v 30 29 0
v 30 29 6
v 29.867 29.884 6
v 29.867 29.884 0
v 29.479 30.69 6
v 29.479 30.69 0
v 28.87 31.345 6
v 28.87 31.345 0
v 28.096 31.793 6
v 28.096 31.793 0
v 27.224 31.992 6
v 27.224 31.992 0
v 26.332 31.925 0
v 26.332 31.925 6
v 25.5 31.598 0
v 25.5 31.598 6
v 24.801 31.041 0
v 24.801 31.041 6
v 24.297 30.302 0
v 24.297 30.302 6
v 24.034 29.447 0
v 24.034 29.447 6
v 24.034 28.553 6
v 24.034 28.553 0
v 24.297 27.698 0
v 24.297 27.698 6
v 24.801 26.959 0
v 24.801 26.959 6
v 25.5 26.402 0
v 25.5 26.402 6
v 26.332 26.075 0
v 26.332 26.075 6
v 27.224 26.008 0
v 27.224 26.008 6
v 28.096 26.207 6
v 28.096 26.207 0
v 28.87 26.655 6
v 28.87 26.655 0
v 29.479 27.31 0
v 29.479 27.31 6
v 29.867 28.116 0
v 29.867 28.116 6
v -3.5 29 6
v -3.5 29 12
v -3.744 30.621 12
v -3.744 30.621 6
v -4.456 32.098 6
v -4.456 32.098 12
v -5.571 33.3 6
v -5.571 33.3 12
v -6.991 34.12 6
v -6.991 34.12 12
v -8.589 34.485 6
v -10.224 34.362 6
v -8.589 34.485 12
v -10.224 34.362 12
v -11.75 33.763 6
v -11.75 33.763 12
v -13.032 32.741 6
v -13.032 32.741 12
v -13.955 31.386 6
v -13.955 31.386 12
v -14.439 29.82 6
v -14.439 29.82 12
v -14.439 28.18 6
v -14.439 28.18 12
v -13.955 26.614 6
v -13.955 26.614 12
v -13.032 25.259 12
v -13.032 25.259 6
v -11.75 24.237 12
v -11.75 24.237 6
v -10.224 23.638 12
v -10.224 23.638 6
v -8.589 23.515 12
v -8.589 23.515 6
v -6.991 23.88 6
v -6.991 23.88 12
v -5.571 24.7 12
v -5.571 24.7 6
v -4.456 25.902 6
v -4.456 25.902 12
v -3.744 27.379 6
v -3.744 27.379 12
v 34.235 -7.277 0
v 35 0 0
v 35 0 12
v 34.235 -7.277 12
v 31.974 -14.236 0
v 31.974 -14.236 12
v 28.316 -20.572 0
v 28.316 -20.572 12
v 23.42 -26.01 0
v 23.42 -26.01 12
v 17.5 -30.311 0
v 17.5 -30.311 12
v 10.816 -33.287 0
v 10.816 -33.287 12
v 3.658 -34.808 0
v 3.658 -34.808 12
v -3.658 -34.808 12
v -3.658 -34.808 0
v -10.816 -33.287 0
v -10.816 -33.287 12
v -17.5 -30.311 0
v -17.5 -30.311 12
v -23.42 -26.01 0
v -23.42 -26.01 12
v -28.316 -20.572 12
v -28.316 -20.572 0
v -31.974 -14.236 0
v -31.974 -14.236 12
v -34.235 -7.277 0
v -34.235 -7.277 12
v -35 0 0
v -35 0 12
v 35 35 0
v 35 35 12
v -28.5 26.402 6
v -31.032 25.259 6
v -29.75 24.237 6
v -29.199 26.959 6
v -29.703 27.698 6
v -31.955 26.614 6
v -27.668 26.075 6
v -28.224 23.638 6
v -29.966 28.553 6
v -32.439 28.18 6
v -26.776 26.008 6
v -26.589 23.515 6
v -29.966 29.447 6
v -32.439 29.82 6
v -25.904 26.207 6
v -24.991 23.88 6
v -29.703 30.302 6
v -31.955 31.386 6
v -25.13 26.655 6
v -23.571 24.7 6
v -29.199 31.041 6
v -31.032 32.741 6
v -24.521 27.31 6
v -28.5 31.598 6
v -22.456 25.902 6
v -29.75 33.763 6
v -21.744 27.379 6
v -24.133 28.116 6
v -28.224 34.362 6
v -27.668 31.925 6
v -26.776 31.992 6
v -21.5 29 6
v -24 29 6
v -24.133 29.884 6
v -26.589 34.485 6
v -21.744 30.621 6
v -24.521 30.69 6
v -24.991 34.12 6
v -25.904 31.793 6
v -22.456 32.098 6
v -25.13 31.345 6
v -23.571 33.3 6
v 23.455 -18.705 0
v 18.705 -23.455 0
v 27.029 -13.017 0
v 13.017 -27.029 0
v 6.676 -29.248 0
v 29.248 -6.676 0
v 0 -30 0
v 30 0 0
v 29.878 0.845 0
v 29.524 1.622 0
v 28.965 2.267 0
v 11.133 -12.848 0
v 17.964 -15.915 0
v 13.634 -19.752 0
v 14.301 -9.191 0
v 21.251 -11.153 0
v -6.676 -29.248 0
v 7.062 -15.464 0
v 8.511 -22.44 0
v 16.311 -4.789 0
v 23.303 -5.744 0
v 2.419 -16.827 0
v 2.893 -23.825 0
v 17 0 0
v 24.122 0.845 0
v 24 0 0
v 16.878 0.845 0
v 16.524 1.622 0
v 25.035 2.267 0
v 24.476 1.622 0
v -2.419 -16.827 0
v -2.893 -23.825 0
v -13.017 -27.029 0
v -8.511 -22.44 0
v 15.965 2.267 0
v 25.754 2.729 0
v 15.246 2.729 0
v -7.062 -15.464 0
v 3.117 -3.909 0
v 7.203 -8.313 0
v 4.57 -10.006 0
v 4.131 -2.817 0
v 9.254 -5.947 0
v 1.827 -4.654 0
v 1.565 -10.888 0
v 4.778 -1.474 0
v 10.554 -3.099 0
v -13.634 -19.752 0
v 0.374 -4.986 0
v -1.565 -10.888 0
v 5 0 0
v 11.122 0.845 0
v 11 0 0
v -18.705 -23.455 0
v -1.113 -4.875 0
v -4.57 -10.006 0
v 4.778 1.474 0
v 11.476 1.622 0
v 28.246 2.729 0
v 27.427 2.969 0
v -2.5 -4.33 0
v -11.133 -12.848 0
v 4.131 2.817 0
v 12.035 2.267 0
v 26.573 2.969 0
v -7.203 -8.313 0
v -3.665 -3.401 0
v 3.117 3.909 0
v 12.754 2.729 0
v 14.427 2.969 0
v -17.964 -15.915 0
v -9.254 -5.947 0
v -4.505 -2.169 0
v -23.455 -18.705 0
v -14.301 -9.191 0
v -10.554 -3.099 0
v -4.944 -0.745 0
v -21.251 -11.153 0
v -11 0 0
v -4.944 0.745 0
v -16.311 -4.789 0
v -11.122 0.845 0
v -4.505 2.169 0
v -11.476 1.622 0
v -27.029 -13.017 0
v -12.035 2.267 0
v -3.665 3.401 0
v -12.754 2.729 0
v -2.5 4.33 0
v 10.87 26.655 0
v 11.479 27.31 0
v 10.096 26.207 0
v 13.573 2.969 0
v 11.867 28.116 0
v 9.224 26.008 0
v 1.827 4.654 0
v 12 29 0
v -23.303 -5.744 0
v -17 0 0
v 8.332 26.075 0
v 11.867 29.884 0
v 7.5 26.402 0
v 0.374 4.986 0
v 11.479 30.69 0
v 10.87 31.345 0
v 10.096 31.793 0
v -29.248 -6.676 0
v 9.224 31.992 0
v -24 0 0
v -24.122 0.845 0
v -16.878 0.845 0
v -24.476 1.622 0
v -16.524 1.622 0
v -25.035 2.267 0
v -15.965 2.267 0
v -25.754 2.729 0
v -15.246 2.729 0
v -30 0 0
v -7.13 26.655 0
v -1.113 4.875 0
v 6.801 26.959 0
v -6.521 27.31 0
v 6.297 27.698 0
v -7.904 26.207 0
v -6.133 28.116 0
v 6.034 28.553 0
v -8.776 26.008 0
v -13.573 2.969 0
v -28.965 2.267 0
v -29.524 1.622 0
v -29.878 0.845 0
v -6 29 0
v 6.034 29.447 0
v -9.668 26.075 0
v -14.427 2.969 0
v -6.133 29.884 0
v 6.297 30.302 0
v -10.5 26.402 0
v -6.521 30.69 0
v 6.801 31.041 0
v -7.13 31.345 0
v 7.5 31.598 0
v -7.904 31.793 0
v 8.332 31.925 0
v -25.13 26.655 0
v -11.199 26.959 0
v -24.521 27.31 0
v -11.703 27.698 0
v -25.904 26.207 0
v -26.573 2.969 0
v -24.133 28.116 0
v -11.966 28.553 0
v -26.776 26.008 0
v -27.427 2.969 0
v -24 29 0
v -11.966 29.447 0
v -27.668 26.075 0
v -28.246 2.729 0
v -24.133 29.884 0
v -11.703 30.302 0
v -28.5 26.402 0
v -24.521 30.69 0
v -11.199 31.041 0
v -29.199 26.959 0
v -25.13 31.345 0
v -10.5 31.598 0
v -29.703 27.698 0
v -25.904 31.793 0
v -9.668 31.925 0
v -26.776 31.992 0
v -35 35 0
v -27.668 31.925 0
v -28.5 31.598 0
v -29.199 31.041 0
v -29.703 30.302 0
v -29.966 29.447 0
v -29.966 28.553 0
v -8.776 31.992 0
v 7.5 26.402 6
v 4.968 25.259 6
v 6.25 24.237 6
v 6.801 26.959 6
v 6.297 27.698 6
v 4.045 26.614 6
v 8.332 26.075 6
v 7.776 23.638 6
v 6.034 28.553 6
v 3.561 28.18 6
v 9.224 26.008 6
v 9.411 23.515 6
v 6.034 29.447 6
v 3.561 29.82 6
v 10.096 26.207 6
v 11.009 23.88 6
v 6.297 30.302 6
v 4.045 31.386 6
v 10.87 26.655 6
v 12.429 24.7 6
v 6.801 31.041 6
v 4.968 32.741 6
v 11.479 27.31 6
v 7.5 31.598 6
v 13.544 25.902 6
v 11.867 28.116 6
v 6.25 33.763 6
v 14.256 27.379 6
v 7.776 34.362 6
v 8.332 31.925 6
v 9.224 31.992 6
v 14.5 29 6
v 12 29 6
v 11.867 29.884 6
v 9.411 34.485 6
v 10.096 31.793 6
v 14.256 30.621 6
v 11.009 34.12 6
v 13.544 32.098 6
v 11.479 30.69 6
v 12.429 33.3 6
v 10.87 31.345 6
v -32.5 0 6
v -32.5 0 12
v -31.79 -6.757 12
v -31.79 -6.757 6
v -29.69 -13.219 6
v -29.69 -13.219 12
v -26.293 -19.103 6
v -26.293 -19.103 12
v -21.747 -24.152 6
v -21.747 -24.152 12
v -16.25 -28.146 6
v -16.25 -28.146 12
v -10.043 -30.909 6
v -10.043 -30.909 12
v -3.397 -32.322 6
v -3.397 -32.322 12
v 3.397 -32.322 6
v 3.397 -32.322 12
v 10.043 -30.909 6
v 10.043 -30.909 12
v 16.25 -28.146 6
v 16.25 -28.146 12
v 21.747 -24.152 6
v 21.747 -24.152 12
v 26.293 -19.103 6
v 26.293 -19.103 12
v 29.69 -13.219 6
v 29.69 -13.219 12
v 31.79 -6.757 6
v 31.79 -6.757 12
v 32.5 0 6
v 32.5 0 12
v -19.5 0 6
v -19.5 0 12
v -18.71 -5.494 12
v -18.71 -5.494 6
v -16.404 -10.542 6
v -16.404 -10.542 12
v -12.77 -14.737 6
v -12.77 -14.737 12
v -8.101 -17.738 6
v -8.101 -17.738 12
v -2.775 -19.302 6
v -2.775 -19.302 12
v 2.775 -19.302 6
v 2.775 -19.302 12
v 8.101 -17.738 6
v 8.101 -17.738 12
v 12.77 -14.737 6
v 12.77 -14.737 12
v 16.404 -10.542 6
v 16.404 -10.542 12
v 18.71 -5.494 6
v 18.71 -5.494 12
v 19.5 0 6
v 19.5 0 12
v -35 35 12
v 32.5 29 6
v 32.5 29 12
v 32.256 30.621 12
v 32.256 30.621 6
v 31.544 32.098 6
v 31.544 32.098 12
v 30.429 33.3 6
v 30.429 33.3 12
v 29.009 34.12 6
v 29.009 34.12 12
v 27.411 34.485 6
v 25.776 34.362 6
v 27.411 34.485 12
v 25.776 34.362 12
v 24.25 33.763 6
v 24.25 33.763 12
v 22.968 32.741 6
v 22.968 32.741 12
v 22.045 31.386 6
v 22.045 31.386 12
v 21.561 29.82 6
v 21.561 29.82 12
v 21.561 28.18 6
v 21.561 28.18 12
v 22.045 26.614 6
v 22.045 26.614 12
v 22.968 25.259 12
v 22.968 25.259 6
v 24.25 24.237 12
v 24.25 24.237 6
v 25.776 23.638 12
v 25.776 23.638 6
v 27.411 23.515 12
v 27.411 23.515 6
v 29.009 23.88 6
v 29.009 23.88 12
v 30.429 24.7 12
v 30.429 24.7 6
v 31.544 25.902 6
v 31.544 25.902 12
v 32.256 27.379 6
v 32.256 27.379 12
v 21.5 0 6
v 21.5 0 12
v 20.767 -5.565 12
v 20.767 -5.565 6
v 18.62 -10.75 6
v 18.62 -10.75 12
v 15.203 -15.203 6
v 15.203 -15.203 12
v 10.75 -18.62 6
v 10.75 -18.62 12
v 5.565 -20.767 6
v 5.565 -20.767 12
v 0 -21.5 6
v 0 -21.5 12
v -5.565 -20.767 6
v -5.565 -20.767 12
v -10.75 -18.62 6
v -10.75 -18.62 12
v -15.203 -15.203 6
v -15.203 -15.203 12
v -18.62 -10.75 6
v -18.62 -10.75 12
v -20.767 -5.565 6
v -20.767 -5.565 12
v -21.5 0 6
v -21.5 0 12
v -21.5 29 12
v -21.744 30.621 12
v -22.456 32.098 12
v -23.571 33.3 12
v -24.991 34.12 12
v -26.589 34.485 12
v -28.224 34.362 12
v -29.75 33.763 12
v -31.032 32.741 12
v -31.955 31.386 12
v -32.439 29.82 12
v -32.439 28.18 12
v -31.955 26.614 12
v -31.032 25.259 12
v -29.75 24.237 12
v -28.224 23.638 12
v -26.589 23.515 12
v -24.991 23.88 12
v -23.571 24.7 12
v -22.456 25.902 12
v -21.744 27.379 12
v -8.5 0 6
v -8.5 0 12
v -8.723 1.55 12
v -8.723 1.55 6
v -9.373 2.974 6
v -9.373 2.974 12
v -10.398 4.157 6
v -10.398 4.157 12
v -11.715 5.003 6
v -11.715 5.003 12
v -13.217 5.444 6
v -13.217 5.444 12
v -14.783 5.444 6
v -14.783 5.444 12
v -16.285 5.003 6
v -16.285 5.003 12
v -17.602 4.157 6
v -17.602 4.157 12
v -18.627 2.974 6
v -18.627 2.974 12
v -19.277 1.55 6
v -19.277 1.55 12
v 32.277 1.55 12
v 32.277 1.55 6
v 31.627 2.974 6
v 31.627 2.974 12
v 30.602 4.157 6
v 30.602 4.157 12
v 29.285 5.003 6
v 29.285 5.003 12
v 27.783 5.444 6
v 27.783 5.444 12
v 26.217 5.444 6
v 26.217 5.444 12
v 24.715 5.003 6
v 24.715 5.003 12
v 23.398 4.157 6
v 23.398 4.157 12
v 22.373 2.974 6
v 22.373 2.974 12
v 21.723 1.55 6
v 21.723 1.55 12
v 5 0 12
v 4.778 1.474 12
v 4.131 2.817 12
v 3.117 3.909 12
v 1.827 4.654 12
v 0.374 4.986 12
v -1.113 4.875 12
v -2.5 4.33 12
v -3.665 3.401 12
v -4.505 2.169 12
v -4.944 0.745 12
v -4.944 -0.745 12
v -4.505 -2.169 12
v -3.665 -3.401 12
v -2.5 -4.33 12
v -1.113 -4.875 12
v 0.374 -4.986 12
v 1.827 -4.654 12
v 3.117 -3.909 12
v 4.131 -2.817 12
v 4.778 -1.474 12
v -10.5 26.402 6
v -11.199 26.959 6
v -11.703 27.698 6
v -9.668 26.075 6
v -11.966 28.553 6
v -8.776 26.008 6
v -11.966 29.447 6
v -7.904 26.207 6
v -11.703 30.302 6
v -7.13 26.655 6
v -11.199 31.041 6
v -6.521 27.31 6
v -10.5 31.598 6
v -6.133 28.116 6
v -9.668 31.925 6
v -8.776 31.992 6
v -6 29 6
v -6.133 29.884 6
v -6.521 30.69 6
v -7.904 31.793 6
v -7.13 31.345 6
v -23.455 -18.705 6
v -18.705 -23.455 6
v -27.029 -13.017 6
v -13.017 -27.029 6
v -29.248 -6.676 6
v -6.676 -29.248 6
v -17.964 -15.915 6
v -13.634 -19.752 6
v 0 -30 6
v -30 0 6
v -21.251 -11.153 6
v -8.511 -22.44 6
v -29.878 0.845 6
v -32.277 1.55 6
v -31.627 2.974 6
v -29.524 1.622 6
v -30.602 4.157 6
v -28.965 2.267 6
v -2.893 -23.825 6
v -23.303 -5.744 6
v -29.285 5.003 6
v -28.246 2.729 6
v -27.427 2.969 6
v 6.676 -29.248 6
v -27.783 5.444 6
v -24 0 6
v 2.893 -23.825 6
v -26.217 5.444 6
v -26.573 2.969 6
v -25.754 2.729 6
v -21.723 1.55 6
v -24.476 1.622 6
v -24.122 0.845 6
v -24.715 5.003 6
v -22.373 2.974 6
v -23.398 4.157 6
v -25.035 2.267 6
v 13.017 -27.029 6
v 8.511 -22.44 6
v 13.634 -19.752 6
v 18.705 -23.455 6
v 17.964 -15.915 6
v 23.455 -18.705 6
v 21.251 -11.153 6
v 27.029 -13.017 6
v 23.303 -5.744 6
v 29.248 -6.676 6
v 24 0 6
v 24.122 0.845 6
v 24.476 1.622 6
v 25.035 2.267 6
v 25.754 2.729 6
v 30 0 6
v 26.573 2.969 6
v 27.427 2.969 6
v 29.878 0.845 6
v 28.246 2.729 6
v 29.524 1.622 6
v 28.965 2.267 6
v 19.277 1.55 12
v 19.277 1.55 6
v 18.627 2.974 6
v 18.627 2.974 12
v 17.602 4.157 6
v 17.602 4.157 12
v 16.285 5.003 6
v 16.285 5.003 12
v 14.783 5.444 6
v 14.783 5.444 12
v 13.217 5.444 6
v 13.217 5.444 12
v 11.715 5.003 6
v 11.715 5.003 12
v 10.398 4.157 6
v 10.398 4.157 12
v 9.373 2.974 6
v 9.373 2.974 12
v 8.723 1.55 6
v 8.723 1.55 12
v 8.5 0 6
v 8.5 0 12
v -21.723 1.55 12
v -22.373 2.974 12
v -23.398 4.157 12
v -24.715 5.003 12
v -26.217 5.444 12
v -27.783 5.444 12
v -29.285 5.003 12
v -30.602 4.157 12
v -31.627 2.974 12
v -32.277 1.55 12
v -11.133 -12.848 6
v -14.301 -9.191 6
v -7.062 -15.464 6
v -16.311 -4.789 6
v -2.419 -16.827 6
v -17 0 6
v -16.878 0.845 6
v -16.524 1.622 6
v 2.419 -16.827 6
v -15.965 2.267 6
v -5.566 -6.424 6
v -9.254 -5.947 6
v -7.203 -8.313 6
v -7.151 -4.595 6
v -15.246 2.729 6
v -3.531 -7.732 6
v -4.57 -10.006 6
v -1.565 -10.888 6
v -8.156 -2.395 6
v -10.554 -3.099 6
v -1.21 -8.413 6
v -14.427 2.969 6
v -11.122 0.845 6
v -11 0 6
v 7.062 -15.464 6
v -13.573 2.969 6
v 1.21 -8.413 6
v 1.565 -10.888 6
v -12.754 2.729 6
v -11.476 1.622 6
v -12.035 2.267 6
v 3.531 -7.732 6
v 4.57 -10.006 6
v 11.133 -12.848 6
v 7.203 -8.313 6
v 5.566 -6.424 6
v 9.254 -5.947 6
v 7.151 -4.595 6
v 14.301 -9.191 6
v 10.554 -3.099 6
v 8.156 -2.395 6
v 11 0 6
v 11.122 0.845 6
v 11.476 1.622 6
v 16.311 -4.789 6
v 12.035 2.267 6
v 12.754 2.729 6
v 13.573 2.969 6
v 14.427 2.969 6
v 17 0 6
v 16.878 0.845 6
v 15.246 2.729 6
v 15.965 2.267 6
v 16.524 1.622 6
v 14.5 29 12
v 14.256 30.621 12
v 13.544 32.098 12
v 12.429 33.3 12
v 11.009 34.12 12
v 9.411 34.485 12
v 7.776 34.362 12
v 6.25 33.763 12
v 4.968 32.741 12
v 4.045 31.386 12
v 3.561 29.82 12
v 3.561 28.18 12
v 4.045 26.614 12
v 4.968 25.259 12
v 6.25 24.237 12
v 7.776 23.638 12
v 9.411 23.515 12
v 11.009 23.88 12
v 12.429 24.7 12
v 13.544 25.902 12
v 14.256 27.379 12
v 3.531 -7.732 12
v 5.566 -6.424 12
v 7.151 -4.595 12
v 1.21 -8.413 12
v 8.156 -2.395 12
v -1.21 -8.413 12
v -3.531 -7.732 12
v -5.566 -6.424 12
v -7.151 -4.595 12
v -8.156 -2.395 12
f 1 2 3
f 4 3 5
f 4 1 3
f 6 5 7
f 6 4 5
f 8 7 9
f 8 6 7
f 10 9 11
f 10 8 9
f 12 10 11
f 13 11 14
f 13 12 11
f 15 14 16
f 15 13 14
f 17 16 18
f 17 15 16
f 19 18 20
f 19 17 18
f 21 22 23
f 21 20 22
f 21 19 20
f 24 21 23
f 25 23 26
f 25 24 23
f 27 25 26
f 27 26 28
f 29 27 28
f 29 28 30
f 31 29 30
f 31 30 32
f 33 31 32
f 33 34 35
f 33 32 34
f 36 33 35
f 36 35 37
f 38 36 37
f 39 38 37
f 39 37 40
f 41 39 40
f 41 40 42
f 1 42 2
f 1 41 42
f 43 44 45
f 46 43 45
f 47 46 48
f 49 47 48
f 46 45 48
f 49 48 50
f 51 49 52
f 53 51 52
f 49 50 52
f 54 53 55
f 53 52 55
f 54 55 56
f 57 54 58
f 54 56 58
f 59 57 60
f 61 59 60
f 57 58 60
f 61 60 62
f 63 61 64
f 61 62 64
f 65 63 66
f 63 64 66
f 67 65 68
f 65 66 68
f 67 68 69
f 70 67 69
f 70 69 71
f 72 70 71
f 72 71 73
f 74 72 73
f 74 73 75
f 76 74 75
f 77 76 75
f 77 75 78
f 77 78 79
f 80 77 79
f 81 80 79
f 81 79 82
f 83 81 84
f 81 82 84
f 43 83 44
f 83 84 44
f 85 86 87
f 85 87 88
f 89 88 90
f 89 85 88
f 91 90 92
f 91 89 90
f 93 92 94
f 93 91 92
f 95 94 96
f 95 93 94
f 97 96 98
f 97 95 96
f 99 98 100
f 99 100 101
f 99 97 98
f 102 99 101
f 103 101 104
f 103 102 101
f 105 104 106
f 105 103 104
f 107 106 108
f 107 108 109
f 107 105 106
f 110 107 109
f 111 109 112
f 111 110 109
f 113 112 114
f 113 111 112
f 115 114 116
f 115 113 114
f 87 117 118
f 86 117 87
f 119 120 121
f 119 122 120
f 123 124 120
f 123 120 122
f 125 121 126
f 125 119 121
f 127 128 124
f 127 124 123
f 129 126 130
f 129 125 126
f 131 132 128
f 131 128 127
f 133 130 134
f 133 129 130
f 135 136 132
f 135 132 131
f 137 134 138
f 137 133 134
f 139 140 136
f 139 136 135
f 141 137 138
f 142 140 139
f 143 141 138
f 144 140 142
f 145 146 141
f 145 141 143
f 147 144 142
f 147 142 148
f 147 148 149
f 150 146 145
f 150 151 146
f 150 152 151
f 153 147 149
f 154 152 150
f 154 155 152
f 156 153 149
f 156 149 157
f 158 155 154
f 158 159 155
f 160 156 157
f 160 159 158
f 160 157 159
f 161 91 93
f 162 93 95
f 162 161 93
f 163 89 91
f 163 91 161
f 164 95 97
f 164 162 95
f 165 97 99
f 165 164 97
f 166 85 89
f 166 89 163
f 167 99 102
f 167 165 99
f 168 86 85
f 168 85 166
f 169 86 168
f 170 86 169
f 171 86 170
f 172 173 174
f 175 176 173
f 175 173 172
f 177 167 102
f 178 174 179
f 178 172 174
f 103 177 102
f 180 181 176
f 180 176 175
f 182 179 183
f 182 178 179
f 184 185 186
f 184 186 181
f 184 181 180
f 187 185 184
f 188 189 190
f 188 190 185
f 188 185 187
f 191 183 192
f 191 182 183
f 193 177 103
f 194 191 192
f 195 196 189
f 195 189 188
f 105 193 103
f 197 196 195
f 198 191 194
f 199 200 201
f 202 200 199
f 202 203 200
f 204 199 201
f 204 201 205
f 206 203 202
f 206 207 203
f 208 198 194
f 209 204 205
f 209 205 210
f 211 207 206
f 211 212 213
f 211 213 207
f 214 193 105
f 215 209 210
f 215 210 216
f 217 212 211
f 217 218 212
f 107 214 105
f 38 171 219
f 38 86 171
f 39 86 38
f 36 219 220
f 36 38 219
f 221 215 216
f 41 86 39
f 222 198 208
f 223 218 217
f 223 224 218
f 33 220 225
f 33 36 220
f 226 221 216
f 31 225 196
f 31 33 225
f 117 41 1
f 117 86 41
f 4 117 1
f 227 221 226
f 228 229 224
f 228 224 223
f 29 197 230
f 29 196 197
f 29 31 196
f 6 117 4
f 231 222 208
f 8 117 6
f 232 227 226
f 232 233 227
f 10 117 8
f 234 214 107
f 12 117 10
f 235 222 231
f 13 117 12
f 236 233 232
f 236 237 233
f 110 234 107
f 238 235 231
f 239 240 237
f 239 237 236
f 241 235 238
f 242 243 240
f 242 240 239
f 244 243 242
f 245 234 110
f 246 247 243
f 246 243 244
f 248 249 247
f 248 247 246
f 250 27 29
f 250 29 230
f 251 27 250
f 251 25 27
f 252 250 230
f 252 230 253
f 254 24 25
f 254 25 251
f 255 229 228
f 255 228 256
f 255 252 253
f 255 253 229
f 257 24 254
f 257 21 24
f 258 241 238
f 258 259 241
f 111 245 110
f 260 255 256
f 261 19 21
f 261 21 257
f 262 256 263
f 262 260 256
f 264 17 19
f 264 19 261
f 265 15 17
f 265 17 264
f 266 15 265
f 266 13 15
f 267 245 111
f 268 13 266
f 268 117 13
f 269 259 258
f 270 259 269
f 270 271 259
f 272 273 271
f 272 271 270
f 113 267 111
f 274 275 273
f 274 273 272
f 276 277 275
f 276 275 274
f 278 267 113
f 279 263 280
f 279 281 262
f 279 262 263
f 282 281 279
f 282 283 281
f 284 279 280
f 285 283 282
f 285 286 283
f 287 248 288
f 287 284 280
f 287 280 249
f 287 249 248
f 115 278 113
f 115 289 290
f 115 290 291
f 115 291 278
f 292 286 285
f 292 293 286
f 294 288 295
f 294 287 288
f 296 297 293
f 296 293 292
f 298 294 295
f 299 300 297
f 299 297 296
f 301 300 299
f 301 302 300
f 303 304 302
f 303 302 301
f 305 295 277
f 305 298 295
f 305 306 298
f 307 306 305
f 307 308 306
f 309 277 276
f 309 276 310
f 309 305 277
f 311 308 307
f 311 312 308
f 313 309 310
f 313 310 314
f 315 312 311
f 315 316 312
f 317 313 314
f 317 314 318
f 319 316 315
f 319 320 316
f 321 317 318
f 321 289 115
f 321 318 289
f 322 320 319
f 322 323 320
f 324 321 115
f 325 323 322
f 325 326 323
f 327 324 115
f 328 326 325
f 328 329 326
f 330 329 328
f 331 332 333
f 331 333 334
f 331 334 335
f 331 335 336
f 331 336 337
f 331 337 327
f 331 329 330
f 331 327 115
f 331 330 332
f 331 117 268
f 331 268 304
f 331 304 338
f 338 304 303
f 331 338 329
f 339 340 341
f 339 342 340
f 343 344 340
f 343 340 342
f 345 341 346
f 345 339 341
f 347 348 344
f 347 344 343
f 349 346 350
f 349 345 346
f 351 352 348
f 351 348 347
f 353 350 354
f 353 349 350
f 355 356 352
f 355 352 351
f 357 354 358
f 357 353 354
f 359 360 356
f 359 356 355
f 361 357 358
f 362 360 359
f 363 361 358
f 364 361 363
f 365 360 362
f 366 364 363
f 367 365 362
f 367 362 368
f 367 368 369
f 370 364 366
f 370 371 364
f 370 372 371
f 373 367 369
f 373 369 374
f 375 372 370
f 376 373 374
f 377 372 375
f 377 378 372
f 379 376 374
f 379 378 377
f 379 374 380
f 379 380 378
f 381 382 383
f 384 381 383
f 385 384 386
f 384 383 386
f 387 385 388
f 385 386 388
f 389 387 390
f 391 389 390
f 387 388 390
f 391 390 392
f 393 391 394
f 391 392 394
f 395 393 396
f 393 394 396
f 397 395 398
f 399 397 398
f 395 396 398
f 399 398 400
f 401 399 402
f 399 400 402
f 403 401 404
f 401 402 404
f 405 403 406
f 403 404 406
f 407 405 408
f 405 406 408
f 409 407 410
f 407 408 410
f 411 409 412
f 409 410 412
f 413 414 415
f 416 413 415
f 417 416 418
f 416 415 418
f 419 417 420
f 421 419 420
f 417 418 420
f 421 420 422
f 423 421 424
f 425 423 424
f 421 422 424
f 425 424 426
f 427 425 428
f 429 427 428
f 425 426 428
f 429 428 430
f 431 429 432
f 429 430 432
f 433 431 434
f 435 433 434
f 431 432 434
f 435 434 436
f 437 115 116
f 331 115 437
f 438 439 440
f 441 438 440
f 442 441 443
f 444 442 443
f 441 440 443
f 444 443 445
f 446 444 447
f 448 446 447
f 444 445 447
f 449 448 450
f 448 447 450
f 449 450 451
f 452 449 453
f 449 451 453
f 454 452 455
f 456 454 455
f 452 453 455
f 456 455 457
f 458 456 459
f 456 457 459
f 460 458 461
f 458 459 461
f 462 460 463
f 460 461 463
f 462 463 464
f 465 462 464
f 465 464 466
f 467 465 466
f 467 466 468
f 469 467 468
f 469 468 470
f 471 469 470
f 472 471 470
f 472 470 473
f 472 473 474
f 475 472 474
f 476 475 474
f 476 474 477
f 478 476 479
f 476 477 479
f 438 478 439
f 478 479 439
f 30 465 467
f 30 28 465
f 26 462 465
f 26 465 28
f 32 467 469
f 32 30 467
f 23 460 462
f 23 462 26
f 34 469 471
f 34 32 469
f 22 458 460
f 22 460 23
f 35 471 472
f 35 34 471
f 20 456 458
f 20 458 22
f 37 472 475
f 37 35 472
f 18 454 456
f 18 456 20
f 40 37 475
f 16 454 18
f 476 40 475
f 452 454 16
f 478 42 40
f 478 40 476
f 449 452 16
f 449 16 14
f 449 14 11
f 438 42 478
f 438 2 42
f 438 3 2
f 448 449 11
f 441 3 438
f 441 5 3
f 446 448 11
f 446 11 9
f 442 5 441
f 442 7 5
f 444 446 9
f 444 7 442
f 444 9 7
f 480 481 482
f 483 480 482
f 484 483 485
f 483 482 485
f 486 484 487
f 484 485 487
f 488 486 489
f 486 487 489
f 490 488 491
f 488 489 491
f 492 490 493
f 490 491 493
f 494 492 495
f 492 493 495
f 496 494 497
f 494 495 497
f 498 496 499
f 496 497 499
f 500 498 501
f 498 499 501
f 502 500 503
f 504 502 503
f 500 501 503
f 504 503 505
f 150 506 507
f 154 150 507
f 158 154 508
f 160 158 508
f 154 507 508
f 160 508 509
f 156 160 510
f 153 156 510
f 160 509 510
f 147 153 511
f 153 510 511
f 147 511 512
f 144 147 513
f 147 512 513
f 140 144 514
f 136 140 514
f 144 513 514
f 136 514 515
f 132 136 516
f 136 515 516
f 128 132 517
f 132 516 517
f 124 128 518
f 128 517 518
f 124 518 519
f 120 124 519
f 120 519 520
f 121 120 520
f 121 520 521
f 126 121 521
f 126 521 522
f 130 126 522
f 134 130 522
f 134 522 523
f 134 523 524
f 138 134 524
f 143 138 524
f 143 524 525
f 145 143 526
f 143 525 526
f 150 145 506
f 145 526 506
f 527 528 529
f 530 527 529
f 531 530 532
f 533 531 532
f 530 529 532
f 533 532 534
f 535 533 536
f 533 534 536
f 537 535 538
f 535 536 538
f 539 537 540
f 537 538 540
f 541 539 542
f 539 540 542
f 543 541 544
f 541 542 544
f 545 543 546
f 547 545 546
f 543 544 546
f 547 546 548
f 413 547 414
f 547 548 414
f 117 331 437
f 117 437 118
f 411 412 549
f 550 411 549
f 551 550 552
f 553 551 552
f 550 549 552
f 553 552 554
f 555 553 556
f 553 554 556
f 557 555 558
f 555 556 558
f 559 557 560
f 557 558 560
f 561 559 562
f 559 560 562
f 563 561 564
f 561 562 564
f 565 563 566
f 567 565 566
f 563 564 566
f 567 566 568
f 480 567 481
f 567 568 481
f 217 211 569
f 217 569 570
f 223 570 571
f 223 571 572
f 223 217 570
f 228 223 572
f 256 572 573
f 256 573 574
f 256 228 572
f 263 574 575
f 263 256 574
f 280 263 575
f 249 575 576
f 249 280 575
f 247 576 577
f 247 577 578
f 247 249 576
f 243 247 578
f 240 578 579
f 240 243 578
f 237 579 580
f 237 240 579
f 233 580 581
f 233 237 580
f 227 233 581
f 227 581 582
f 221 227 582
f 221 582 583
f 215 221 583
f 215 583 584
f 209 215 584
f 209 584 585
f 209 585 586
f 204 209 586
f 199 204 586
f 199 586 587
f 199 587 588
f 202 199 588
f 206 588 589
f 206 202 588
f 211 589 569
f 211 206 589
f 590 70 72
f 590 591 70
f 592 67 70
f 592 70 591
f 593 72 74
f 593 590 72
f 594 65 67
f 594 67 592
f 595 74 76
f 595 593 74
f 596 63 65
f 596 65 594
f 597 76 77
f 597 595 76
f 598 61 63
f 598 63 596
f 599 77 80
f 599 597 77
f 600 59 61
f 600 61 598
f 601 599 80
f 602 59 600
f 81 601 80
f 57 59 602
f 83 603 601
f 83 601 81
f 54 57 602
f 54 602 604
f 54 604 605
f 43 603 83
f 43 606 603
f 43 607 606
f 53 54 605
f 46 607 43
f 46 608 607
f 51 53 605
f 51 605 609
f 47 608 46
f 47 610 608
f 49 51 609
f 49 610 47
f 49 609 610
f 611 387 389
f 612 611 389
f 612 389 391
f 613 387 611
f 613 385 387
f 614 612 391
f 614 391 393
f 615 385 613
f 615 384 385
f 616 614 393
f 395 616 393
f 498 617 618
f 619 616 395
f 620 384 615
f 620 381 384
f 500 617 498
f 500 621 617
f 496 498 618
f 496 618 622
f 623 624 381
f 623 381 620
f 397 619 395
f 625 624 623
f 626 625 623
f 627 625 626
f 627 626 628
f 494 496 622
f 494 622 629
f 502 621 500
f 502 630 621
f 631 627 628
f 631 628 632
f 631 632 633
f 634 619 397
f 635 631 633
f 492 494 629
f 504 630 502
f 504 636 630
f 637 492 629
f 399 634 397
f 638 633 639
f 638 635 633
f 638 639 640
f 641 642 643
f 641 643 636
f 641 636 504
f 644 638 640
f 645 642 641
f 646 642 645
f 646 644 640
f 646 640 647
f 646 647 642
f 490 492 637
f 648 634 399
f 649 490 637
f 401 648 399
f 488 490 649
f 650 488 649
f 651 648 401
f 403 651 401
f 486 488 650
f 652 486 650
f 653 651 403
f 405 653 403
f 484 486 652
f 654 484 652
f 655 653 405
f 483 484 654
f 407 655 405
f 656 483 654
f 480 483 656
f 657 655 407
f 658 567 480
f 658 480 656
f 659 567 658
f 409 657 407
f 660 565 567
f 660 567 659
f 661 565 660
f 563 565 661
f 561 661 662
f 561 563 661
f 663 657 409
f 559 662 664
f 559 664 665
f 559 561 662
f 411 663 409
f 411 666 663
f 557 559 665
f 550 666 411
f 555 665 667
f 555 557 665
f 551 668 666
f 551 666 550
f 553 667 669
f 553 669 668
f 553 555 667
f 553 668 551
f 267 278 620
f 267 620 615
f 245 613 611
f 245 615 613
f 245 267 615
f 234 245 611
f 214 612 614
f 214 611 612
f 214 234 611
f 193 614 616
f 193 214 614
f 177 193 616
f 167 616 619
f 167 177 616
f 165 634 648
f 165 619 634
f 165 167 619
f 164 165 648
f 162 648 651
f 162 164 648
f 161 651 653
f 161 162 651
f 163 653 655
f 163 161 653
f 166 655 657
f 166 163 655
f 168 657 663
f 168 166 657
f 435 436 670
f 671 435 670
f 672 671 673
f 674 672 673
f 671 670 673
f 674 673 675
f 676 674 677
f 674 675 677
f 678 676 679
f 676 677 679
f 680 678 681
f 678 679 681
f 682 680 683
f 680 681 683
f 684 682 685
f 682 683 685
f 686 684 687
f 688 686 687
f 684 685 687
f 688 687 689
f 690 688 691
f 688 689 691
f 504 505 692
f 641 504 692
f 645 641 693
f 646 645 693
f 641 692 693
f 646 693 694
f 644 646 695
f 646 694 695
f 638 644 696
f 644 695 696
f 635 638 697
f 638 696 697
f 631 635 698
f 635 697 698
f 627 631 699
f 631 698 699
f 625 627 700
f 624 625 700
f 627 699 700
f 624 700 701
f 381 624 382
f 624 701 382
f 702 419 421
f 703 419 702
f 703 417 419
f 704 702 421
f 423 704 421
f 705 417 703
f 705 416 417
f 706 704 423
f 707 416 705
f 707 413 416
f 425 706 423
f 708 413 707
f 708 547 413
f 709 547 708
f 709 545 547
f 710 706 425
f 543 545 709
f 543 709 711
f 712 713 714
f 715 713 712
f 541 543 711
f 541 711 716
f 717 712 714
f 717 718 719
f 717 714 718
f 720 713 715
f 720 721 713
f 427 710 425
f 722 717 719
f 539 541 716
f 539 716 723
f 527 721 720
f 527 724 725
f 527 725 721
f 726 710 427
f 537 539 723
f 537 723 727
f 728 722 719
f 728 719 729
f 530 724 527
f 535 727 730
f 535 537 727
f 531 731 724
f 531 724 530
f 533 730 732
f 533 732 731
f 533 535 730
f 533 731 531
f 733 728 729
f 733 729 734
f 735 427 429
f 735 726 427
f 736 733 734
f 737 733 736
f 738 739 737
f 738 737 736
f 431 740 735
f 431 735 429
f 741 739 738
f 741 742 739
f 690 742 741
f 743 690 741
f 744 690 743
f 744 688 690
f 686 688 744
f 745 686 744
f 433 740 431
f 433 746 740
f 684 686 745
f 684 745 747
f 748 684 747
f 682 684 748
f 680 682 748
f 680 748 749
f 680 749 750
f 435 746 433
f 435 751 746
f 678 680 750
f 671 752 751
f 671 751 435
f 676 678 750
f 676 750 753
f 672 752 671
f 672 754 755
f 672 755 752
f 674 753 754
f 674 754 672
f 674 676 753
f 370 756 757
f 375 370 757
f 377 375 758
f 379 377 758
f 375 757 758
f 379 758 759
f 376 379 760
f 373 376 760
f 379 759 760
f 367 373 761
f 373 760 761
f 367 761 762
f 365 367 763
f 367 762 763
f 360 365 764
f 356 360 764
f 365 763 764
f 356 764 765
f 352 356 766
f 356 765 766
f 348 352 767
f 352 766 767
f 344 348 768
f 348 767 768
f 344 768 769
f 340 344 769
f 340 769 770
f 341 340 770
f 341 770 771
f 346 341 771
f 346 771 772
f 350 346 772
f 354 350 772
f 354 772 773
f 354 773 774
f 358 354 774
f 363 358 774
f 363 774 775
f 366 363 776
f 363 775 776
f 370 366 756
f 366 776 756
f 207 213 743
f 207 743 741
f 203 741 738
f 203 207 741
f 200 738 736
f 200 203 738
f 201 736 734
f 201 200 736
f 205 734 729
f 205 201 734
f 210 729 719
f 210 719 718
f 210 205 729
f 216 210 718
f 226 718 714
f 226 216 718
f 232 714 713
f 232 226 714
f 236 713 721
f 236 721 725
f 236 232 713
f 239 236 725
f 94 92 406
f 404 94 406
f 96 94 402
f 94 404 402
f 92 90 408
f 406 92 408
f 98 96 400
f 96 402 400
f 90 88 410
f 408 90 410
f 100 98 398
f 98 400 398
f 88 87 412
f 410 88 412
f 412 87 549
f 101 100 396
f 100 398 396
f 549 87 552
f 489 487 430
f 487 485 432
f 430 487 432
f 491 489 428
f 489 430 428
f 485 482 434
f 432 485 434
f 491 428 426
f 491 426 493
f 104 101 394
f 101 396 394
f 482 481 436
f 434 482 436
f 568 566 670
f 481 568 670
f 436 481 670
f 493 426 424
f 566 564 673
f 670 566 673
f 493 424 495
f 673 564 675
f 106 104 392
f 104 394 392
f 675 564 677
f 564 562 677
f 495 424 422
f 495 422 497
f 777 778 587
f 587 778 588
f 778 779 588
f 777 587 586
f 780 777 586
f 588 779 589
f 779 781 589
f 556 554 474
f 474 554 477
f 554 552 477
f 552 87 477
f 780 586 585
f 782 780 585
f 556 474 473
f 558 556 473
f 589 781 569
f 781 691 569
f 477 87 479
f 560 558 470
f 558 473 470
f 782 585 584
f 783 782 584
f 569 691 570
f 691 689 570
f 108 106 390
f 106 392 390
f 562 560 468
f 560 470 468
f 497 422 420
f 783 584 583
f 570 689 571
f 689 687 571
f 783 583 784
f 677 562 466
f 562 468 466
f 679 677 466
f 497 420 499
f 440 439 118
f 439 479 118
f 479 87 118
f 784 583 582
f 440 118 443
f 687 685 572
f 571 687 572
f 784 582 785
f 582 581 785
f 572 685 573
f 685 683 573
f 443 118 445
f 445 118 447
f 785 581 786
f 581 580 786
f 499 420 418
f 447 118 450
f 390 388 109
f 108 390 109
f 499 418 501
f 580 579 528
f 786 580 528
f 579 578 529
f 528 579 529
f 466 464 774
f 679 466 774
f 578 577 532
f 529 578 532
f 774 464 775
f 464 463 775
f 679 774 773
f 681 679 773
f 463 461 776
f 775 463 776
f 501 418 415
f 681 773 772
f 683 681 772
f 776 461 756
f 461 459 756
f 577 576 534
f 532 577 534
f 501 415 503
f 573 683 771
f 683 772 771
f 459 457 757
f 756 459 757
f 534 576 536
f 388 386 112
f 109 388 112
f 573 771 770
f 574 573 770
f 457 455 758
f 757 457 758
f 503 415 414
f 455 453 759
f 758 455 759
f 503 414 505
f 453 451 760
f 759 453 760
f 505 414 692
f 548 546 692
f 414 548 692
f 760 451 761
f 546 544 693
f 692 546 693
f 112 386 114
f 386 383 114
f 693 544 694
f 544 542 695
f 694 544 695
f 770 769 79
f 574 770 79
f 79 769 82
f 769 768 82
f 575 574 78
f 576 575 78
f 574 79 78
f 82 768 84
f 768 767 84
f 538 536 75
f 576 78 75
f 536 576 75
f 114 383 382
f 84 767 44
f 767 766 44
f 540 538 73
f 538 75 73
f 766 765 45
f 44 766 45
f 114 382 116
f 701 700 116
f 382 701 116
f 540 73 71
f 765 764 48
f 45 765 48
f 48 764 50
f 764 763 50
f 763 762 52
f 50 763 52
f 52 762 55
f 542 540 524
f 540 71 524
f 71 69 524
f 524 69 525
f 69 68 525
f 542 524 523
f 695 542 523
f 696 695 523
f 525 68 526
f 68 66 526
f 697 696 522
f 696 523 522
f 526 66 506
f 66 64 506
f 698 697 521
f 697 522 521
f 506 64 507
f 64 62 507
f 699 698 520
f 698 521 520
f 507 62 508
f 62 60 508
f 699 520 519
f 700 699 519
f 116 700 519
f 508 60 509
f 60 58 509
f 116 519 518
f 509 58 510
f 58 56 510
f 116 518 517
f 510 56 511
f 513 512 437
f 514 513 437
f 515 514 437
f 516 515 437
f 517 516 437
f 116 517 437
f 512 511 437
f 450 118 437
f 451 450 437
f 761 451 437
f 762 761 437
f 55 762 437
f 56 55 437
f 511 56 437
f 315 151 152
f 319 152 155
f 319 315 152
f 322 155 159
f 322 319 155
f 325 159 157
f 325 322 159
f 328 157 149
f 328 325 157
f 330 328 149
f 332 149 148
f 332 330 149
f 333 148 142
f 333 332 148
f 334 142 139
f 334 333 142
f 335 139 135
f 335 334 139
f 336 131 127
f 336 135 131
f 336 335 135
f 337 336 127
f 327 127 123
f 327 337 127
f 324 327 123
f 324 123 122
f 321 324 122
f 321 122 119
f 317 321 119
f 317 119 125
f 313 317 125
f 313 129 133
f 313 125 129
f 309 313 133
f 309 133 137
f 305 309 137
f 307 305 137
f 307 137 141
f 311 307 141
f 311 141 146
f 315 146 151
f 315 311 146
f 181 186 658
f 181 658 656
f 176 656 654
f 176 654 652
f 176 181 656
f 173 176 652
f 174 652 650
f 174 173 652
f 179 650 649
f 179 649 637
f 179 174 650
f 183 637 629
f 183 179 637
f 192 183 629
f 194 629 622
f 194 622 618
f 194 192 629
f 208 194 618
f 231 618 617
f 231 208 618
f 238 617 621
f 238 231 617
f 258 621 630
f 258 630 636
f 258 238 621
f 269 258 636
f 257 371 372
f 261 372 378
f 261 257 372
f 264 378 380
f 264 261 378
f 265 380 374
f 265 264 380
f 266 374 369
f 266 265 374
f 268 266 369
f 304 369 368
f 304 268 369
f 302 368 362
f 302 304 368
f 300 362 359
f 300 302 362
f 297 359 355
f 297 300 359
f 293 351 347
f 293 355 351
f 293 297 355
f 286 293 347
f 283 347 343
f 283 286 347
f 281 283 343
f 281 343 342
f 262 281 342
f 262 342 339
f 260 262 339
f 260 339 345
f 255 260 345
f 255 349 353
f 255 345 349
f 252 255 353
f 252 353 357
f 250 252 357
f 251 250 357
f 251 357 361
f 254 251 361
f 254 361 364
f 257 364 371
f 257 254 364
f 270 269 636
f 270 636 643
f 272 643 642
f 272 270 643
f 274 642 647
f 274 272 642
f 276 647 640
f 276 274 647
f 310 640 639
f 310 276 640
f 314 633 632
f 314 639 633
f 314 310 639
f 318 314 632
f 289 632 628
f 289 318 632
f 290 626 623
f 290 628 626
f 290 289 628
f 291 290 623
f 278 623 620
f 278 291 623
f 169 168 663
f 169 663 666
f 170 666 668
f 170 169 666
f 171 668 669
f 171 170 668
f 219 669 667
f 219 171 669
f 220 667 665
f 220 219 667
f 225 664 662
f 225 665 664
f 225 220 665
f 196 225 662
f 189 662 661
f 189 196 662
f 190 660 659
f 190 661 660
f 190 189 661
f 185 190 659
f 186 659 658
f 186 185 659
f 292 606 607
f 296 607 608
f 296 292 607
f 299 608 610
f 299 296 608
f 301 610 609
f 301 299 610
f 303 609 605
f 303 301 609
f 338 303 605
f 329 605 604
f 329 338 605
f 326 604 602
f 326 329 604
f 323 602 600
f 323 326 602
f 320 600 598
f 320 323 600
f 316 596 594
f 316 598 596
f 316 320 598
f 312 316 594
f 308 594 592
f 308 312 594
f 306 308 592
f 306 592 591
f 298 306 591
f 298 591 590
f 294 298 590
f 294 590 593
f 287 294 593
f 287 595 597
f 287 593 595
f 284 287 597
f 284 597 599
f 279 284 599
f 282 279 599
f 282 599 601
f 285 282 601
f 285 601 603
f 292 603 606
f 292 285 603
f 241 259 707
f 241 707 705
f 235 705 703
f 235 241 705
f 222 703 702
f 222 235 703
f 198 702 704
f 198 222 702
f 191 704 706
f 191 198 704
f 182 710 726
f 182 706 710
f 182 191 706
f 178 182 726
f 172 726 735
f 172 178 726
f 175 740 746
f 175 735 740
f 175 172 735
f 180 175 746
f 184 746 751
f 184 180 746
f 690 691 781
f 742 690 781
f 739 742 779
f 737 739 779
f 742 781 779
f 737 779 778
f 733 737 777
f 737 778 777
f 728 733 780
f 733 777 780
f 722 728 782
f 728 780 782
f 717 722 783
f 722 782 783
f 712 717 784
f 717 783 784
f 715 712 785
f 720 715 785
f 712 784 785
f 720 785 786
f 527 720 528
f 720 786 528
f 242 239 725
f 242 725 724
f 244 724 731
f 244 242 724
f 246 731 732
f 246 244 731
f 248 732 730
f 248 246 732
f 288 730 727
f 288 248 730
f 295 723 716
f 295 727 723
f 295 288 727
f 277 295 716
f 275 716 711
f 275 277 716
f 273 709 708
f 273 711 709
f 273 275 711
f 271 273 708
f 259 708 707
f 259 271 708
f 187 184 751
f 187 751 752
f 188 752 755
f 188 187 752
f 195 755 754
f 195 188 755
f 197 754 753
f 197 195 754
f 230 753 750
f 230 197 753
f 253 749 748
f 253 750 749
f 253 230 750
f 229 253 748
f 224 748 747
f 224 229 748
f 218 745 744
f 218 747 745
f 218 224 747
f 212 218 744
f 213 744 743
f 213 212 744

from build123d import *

# Parameters (mm, degrees)
SKETCH_1_R          = 5
SKETCH_1_R_2        = 3
EXTRUDE_1_DEPTH     = 12
SKETCH_2_R          = 5.5
CUT_EXTRUDE_1_DEPTH = 6


with BuildPart() as part:
    # 草图1 → 凸台-拉伸1 (new body)
    with BuildSketch(Plane.XY):
        with BuildLine():
            Line((-35, 0), (-35, 35))
            Line((-35, 35), (35, 35))
            Line((35, 35), (35, 0))
            ThreePointArc((35, 0), (0, -35), (-35, 0))
        make_face()
        Circle(SKETCH_1_R, mode=Mode.SUBTRACT)
        with Locations((-27, 29)):
            Circle(SKETCH_1_R_2, mode=Mode.SUBTRACT)
        with Locations((-9, 29)):
            Circle(SKETCH_1_R_2, mode=Mode.SUBTRACT)
        with Locations((9, 29)):
            Circle(SKETCH_1_R_2, mode=Mode.SUBTRACT)
        with Locations((27, 29)):
            Circle(SKETCH_1_R_2, mode=Mode.SUBTRACT)
        with BuildLine():
            ThreePointArc((30, 0), (27, 3), (24, 0))
            ThreePointArc((24, 0), (0, -24), (-24, 0))
            ThreePointArc((-24, 0), (-27, 3), (-30, 0))
            ThreePointArc((-30, 0), (0, -30), (30, 0))
        make_face(mode=Mode.SUBTRACT)
        with BuildLine():
            ThreePointArc((17, 0), (14, 3), (11, 0))
            ThreePointArc((11, 0), (0, -11), (-11, 0))
            ThreePointArc((-11, 0), (-14, 3), (-17, 0))
            ThreePointArc((-17, 0), (0, -17), (17, 0))
        make_face(mode=Mode.SUBTRACT)
    extrude(amount=EXTRUDE_1_DEPTH)

    # 草图2 → 切除-拉伸1 (cut)
    with BuildSketch(Plane.XY.offset(12)):
        with Locations((-27, 29)):
            Circle(SKETCH_2_R)
        with Locations((-9, 29)):
            Circle(SKETCH_2_R)
        with Locations((9, 29)):
            Circle(SKETCH_2_R)
        with Locations((27, 29)):
            Circle(SKETCH_2_R)
        with BuildLine():
            ThreePointArc((32.5, 0), (27, 5.5), (21.5, 0))
            ThreePointArc((21.5, 0), (0, -21.5), (-21.5, 0))
            ThreePointArc((-21.5, 0), (-27, 5.5), (-32.5, 0))
            ThreePointArc((-32.5, 0), (0, -32.5), (32.5, 0))
        make_face()
        with BuildLine():
            ThreePointArc((19.5, 0), (14, 5.5), (8.5, 0))
            ThreePointArc((8.5, 0), (0, -8.5), (-8.5, 0))
            ThreePointArc((-8.5, 0), (-14, 5.5), (-19.5, 0))
            ThreePointArc((-19.5, 0), (0, -19.5), (19.5, 0))
        make_face()
    extrude(amount=-CUT_EXTRUDE_1_DEPTH, mode=Mode.SUBTRACT)


solid = part.part
